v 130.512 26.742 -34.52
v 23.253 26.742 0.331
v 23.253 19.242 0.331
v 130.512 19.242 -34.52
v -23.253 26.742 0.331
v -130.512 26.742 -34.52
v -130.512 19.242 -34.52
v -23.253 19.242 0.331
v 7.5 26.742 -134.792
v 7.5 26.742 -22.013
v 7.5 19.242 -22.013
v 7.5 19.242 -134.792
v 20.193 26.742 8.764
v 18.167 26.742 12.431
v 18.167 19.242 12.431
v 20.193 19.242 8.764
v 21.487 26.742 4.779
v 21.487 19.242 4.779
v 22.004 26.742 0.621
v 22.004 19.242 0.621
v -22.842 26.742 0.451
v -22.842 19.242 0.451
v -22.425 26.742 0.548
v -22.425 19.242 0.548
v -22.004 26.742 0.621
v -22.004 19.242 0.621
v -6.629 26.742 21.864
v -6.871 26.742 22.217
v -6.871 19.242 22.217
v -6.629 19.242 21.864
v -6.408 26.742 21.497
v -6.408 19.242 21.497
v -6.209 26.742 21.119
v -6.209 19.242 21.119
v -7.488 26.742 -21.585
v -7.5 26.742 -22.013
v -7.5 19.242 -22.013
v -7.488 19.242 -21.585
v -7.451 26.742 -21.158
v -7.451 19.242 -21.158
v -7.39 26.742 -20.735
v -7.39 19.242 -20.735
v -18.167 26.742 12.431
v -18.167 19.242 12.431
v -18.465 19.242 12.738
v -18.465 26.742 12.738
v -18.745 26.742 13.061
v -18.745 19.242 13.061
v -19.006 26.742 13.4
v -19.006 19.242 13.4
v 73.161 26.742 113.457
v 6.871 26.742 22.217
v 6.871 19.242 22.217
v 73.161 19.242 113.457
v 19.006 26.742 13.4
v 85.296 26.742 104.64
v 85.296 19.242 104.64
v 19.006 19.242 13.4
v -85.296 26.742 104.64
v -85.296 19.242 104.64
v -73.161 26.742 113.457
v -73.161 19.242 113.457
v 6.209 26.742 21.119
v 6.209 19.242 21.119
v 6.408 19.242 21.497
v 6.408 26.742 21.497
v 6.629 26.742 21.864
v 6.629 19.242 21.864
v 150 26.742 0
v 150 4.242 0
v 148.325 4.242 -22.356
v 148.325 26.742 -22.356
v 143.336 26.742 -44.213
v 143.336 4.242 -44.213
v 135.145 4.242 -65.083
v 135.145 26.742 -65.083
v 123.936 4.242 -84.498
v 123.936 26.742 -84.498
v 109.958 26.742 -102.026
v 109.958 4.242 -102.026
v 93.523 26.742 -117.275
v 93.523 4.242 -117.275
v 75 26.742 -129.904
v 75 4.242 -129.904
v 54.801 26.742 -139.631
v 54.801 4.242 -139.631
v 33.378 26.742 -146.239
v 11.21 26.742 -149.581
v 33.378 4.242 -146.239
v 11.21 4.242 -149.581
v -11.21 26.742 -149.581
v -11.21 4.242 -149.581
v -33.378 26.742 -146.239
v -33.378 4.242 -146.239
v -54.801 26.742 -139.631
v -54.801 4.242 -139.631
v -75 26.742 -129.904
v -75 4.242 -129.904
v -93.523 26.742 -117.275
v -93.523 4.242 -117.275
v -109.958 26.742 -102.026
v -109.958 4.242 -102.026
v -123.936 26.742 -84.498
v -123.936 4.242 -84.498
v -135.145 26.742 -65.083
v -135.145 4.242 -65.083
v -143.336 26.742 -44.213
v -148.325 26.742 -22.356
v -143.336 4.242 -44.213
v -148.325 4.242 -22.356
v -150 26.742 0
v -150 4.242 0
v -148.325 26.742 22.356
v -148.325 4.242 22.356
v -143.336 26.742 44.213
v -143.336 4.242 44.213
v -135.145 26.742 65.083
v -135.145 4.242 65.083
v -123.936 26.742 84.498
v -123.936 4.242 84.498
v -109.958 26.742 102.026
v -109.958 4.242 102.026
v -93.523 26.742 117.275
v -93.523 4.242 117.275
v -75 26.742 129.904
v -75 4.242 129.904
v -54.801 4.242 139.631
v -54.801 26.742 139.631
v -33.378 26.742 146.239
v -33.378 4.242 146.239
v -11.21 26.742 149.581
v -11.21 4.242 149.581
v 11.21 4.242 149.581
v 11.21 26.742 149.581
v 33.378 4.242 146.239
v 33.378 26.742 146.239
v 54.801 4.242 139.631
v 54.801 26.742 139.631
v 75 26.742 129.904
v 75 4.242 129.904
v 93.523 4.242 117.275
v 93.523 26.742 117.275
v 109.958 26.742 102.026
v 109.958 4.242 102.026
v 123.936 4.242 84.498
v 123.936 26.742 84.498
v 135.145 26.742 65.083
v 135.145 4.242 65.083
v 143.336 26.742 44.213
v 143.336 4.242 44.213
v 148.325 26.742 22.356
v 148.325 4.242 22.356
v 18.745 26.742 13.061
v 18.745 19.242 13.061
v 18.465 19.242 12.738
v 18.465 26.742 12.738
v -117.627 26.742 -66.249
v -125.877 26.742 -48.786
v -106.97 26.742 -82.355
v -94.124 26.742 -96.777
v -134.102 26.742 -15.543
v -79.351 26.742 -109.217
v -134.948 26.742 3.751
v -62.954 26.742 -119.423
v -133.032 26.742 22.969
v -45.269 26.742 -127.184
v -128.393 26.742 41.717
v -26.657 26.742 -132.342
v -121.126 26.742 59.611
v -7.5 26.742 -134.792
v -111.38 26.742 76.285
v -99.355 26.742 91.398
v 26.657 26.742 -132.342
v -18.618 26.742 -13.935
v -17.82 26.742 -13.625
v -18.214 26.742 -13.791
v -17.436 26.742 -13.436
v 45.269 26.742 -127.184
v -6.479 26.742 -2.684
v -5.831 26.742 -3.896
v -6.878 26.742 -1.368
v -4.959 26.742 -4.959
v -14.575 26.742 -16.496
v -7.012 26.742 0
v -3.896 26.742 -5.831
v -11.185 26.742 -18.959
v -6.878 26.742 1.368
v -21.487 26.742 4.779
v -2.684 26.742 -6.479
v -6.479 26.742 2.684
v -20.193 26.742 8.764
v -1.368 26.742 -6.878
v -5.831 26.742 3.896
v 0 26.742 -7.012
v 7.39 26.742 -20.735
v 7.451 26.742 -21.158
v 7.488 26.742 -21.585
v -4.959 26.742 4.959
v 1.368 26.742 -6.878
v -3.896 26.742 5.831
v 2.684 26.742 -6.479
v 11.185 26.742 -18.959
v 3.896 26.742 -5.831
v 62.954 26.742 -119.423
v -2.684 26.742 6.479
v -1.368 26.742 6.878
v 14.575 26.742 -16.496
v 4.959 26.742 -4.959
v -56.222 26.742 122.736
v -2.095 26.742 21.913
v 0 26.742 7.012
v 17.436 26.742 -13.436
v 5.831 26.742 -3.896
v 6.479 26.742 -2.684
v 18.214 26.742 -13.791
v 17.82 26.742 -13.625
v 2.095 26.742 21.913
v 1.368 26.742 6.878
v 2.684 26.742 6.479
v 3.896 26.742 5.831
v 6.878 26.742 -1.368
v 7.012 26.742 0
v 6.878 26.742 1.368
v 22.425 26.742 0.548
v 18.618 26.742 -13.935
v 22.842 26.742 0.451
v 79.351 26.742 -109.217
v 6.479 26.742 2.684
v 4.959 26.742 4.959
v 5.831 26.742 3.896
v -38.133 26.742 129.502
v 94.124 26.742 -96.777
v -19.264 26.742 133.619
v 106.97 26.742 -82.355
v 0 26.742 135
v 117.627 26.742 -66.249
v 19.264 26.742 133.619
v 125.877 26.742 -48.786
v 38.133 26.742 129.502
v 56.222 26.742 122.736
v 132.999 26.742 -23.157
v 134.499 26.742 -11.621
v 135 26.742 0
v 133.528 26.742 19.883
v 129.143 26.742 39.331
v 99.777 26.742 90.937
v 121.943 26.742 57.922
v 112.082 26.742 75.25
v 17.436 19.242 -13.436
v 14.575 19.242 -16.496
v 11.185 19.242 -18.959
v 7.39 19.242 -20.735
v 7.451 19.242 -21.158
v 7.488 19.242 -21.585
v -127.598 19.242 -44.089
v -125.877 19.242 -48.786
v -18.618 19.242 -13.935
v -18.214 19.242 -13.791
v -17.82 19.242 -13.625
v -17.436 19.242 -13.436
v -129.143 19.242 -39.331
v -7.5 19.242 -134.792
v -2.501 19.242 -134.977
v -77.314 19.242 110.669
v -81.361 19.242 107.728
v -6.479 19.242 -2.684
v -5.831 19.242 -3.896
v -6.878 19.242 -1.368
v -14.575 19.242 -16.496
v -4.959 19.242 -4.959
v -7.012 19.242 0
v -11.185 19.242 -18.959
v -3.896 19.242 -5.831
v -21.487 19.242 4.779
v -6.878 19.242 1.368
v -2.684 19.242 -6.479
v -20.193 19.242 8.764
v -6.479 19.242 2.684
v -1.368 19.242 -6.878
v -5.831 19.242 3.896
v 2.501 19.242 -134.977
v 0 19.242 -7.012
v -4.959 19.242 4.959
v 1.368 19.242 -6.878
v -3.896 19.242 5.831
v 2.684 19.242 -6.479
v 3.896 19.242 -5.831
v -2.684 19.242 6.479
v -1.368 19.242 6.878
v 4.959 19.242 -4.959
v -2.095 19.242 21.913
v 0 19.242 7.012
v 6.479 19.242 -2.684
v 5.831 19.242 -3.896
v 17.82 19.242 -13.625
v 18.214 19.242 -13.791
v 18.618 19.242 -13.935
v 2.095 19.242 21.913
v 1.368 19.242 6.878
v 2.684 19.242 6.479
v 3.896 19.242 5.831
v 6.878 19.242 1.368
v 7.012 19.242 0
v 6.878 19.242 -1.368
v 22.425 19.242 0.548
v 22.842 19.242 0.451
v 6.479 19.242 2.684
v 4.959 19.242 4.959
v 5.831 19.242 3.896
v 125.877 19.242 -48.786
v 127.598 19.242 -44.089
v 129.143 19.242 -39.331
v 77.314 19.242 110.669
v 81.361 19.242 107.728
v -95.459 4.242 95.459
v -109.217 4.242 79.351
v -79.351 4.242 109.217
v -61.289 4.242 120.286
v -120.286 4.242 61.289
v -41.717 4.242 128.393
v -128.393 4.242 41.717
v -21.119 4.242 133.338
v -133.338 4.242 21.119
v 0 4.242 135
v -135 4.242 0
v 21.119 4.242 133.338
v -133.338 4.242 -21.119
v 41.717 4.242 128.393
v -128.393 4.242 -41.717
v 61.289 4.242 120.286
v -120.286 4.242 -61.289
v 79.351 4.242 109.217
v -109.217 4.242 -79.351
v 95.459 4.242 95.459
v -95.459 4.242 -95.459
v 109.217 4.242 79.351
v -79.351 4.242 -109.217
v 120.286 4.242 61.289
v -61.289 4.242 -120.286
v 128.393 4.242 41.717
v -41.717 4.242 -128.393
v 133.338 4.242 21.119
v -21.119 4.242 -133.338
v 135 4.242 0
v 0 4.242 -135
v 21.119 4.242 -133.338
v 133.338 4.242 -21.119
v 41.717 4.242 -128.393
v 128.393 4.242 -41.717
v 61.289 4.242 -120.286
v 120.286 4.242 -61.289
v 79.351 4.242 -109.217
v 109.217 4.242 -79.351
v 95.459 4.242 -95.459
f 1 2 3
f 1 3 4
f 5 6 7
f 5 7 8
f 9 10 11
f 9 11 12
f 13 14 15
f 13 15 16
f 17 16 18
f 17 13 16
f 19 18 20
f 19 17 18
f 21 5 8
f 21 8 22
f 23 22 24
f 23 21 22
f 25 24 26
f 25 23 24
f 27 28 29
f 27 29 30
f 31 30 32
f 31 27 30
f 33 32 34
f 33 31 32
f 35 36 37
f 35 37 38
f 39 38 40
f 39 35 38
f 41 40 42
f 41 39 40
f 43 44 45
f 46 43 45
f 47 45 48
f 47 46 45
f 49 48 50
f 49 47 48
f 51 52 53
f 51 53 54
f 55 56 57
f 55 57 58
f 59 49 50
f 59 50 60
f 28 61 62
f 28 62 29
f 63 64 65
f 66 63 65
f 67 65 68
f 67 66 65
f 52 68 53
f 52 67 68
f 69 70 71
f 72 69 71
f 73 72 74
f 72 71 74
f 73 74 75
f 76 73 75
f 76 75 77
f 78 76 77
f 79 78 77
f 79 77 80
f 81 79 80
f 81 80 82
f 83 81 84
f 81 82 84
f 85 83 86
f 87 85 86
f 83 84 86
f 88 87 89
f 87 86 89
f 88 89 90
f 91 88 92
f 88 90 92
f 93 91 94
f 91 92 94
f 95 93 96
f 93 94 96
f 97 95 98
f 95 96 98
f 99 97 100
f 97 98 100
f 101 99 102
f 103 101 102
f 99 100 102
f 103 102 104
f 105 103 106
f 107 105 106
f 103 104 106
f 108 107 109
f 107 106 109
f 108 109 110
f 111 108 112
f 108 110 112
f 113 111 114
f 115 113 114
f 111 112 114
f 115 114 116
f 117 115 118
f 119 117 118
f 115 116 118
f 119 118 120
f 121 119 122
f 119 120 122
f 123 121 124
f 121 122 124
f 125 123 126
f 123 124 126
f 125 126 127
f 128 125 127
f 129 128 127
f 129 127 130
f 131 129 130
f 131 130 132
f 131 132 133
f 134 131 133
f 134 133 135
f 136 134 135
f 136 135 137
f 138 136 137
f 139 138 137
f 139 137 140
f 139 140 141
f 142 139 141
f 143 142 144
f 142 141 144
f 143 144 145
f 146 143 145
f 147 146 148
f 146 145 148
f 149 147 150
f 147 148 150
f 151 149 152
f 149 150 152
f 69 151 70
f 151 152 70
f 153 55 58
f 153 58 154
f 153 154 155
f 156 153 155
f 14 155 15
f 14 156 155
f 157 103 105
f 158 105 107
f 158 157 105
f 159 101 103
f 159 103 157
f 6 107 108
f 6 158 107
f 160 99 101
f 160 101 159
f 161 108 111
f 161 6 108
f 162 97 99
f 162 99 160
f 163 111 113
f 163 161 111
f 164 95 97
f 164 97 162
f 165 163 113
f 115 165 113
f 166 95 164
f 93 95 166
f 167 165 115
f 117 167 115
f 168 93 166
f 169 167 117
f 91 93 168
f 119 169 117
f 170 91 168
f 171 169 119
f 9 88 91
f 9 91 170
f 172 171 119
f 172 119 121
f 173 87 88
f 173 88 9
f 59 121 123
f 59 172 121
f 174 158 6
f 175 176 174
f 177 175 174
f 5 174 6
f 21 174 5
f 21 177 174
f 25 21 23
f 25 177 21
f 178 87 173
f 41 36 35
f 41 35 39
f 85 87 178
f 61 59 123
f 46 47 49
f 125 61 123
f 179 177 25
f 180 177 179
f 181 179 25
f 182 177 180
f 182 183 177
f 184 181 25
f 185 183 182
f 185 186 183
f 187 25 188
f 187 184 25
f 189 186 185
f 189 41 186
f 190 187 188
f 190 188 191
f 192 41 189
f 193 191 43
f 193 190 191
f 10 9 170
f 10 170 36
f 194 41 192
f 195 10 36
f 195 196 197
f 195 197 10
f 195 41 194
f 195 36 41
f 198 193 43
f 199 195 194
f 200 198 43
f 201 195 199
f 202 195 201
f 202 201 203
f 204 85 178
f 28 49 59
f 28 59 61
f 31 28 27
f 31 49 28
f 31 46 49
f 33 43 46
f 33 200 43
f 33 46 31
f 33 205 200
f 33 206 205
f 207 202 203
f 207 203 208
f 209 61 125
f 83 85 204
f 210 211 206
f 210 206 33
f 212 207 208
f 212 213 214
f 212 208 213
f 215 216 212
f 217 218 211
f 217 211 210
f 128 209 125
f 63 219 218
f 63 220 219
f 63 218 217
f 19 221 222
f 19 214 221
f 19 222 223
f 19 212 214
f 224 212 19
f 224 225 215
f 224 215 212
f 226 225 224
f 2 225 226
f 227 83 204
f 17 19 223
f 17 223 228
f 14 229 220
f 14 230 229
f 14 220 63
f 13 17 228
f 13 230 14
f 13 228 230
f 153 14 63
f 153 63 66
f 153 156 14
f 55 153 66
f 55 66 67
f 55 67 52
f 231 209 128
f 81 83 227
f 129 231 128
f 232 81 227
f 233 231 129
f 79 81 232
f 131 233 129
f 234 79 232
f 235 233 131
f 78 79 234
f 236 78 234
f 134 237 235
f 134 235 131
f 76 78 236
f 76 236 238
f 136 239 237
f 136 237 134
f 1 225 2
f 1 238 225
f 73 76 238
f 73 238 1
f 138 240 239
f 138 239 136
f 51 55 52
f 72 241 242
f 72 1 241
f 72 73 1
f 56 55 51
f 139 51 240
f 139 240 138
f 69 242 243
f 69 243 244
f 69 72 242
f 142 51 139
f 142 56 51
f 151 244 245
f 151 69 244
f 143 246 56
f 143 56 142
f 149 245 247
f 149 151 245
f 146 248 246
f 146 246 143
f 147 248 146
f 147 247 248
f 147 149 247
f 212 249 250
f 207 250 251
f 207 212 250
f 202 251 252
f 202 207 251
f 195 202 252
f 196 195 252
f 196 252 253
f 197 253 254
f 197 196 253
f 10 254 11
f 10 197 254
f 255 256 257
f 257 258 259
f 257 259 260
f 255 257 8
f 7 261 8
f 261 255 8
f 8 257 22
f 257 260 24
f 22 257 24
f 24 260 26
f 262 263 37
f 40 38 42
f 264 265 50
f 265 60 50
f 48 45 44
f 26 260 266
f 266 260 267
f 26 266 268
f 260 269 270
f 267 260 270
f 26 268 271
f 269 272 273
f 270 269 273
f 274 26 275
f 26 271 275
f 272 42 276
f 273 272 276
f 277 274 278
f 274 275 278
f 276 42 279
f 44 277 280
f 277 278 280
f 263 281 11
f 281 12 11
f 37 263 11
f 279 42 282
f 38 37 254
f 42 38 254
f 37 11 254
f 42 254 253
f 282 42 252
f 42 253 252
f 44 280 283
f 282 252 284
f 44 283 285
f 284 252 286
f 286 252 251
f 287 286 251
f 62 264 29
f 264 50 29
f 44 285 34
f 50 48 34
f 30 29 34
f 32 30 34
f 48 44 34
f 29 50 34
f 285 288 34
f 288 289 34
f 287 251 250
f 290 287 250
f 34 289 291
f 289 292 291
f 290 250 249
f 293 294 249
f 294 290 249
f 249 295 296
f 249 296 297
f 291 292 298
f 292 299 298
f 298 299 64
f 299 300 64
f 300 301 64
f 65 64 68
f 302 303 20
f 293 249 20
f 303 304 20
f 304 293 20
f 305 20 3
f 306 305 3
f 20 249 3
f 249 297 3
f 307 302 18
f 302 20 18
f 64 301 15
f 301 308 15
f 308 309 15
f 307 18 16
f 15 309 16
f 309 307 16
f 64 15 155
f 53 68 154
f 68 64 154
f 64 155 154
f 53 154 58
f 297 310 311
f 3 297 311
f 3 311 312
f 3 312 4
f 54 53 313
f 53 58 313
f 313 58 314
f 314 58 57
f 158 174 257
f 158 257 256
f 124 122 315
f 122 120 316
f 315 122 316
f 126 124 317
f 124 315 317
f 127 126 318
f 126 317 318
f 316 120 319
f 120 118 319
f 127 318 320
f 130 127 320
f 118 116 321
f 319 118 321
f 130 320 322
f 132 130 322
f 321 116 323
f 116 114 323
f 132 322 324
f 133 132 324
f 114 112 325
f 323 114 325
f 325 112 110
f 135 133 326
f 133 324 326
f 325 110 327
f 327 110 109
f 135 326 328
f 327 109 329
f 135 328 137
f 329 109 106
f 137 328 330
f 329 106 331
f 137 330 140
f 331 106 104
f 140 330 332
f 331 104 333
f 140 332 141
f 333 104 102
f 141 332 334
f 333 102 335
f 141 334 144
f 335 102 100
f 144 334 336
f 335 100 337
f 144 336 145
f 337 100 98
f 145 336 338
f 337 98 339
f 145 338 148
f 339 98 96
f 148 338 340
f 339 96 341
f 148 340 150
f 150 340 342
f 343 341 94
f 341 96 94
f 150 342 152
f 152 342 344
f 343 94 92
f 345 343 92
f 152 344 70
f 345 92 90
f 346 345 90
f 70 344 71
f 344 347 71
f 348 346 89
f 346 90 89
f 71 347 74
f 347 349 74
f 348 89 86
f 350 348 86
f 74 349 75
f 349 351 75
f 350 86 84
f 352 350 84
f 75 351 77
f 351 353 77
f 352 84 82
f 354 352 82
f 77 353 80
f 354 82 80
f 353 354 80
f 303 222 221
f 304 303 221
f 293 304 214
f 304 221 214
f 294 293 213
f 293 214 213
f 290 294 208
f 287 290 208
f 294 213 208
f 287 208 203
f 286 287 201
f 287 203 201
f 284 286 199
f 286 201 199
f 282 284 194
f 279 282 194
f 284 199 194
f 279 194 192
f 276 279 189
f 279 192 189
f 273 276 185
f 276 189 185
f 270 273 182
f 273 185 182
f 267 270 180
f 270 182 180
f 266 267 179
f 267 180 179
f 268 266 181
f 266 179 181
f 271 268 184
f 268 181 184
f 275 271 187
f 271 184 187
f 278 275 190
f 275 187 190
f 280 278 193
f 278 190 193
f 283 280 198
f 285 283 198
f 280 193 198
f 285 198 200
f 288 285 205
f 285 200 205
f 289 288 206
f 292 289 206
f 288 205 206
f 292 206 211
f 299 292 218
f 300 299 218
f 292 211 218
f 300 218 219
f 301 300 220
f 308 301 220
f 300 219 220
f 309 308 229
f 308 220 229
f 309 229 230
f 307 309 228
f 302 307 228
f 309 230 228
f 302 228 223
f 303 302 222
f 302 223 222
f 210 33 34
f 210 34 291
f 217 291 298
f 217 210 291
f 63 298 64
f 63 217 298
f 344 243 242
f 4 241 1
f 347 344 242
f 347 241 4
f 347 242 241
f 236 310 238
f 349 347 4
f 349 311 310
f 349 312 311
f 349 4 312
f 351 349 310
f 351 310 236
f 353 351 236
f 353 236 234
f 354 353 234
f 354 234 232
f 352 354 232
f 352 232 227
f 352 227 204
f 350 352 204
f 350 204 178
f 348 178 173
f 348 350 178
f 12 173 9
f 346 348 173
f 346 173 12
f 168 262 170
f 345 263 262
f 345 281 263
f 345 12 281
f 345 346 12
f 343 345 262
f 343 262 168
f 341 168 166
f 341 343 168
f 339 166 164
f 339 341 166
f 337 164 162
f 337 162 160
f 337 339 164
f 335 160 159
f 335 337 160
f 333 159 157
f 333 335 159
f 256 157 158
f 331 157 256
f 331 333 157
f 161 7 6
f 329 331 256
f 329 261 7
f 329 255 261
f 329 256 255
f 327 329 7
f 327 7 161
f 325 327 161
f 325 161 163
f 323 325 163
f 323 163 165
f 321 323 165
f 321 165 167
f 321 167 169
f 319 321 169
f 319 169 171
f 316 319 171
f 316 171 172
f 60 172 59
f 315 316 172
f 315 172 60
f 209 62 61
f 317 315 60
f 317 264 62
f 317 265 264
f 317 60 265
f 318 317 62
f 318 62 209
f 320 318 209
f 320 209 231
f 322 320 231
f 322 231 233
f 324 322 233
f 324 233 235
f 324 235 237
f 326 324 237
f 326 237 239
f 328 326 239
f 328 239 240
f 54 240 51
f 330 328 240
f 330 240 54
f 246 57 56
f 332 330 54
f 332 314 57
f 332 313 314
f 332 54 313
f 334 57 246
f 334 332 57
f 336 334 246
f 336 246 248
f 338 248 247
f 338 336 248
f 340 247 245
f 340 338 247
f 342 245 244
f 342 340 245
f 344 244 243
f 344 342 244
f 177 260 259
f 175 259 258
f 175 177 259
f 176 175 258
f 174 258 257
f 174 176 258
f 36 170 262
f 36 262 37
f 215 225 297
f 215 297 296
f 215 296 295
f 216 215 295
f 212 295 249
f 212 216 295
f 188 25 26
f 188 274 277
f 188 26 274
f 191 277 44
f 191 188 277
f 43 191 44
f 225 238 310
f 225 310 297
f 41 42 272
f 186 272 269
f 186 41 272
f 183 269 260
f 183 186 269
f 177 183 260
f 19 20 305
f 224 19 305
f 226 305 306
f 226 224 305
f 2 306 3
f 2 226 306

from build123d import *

# Parameters (mm, degrees)
SKETCH1_R           = 200
SKETCH1_R_2         = 180
EXTRUDE_THIN1_DEPTH = 30
SKETCH2_R           = 29.35
SKETCH2_R_2         = 9.35
EXTRUDE_THIN2_DEPTH = 10
BOSS_EXTRUDE1_DEPTH = 10
CIRPATTERN1_COUNT   = 5
SCALE3_SCALE        = 0.75


with BuildPart() as part:
    # Sketch1 → Extrude-Thin1 (new body)
    with BuildSketch(Plane(origin=(0, 0, 0), x_dir=(1, 0, 0), z_dir=(0, 1, 0))):
        Circle(SKETCH1_R)
        Circle(SKETCH1_R_2, mode=Mode.SUBTRACT)
    extrude(amount=EXTRUDE_THIN1_DEPTH)



with BuildPart() as body_2:
    # Sketch2 → Extrude-Thin2 (new body)
    with BuildSketch(Plane(origin=(0, 30, 0), x_dir=(1, 0, 0), z_dir=(0, 1, 0))):
        Circle(SKETCH2_R)
        Circle(SKETCH2_R_2, mode=Mode.SUBTRACT)
    extrude(amount=-EXTRUDE_THIN2_DEPTH)


with BuildPart() as part_1:
    add(part.part)

    add(body_2.part)  # Boss-Extrude1 merges body 2
    # Sketch3 → Boss-Extrude1 (add)
    with BuildSketch(Plane(origin=(0, 30, 0), x_dir=(1, 0, 0), z_dir=(0, 1, 0))):
        with BuildLine():
            Line((10, 29.35), (10, 180))
            ThreePointArc((10, 180), (0, 190), (-10, 180))
            Line((-10, 180), (-10, 29.35))
            ThreePointArc((-10, 29.35), (0, 19.35), (10, 29.35))
        make_face()
    boss_extrude1 = extrude(amount=-BOSS_EXTRUDE1_DEPTH)

    # CirPattern1: Boss-Extrude1 ×5 about axis
    cirpattern1_axis = Axis((0, 0, 0), (0, 1, 0))
    for i in range(1, CIRPATTERN1_COUNT):
        add(boss_extrude1.rotate(cirpattern1_axis, i * 360 / CIRPATTERN1_COUNT))


with BuildPart() as part_2:
    # Scale3: scaled about (0, 16.967452181, 0)
    add(part_1.part.scale(SCALE3_SCALE).moved(Location((0, 4.241863045, 0))))


solid = part_2.part
